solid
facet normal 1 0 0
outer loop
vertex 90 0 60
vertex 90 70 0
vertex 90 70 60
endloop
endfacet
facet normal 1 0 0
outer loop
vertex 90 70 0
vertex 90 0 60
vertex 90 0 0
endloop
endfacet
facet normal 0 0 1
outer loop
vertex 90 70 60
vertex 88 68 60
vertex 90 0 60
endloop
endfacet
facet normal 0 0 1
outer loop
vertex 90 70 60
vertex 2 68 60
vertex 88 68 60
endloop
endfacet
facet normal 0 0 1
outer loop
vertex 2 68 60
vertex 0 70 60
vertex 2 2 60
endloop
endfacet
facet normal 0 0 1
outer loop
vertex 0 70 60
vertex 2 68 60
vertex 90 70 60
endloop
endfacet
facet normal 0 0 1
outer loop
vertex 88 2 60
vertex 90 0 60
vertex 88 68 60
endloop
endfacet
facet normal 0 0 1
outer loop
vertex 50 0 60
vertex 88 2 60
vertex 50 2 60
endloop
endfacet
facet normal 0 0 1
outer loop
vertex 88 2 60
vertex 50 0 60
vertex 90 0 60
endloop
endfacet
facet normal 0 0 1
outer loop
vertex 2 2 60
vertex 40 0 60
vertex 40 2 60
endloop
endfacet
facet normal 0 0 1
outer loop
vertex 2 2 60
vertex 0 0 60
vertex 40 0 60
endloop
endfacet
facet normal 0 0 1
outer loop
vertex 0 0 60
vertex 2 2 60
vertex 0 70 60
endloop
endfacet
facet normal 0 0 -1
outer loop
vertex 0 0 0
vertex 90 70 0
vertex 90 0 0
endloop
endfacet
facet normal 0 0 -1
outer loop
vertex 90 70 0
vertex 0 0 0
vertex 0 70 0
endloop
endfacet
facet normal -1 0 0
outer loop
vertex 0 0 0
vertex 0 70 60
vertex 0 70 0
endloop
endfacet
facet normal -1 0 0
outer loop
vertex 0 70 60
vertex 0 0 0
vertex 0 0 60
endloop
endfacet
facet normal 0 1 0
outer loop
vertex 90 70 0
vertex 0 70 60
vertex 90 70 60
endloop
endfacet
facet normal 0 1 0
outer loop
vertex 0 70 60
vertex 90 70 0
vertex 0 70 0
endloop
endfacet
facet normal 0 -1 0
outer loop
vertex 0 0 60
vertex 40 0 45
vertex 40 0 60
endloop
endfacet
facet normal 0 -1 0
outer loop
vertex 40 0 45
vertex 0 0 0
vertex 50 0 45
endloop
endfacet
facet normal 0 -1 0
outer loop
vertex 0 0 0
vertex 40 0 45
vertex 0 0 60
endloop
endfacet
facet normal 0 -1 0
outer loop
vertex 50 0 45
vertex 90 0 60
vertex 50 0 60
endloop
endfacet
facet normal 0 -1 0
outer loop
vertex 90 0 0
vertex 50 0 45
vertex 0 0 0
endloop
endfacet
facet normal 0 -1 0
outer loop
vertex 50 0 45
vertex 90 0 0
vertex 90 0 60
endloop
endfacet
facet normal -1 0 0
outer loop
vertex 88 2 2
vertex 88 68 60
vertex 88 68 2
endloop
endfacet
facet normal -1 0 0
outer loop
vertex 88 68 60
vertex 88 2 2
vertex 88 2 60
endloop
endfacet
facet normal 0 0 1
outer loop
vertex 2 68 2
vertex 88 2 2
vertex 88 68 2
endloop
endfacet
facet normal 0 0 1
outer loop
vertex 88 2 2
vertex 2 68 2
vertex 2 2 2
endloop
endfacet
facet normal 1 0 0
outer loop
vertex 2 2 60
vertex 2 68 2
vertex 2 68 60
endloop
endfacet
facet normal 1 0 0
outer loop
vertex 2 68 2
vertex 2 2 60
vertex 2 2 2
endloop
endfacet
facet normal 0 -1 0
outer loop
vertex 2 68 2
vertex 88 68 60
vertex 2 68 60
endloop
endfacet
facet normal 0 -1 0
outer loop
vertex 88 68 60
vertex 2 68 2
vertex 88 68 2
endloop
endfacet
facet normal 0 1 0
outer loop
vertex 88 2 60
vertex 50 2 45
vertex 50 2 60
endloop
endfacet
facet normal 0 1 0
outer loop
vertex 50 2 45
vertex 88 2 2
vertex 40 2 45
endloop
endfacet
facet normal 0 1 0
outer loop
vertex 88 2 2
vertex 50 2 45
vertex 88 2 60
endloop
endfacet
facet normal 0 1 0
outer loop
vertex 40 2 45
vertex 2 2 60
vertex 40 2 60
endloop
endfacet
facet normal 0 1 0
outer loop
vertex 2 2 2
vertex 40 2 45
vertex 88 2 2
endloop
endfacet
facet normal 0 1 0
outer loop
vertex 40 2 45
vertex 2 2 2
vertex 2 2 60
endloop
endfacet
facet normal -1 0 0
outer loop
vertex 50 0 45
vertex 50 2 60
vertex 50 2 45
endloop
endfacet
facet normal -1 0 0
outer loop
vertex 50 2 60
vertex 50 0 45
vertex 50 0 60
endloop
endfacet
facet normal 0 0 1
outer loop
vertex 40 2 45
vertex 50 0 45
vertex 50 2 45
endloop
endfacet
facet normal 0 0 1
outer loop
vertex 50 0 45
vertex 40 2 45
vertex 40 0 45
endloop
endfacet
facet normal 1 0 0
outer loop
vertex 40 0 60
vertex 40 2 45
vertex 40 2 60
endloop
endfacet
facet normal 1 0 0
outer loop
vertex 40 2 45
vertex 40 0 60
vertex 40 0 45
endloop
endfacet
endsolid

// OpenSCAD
$fn = 32;

// ----------------------------------------------------------------------
// Enclosure box: notch enclosure
// ----------------------------------------------------------------------

// --- parameters (mm) ---
box_l = 90;               // outer length, X
box_w = 70;               // outer width, Y
box_h = 60;               // outer height
wall_t = 2;               // wall thickness
notch_w = 10;             // cable notch width
notch_h = 15;             // cable notch height

inner_h = box_h - wall_t;  // cavity depth
boss_h = inner_h - 2;  // corner boss height

difference() {
  union() {
    difference() {
      cube([box_l, box_w, box_h]);
      translate([wall_t, wall_t, wall_t])
        cube([box_l - 2 * wall_t, box_w - 2 * wall_t, box_h]);
    }
  }
  translate([box_l / 2 - notch_w / 2, -1, box_h - notch_h])
    cube([notch_w, wall_t + 2, notch_h + 1]);
}
